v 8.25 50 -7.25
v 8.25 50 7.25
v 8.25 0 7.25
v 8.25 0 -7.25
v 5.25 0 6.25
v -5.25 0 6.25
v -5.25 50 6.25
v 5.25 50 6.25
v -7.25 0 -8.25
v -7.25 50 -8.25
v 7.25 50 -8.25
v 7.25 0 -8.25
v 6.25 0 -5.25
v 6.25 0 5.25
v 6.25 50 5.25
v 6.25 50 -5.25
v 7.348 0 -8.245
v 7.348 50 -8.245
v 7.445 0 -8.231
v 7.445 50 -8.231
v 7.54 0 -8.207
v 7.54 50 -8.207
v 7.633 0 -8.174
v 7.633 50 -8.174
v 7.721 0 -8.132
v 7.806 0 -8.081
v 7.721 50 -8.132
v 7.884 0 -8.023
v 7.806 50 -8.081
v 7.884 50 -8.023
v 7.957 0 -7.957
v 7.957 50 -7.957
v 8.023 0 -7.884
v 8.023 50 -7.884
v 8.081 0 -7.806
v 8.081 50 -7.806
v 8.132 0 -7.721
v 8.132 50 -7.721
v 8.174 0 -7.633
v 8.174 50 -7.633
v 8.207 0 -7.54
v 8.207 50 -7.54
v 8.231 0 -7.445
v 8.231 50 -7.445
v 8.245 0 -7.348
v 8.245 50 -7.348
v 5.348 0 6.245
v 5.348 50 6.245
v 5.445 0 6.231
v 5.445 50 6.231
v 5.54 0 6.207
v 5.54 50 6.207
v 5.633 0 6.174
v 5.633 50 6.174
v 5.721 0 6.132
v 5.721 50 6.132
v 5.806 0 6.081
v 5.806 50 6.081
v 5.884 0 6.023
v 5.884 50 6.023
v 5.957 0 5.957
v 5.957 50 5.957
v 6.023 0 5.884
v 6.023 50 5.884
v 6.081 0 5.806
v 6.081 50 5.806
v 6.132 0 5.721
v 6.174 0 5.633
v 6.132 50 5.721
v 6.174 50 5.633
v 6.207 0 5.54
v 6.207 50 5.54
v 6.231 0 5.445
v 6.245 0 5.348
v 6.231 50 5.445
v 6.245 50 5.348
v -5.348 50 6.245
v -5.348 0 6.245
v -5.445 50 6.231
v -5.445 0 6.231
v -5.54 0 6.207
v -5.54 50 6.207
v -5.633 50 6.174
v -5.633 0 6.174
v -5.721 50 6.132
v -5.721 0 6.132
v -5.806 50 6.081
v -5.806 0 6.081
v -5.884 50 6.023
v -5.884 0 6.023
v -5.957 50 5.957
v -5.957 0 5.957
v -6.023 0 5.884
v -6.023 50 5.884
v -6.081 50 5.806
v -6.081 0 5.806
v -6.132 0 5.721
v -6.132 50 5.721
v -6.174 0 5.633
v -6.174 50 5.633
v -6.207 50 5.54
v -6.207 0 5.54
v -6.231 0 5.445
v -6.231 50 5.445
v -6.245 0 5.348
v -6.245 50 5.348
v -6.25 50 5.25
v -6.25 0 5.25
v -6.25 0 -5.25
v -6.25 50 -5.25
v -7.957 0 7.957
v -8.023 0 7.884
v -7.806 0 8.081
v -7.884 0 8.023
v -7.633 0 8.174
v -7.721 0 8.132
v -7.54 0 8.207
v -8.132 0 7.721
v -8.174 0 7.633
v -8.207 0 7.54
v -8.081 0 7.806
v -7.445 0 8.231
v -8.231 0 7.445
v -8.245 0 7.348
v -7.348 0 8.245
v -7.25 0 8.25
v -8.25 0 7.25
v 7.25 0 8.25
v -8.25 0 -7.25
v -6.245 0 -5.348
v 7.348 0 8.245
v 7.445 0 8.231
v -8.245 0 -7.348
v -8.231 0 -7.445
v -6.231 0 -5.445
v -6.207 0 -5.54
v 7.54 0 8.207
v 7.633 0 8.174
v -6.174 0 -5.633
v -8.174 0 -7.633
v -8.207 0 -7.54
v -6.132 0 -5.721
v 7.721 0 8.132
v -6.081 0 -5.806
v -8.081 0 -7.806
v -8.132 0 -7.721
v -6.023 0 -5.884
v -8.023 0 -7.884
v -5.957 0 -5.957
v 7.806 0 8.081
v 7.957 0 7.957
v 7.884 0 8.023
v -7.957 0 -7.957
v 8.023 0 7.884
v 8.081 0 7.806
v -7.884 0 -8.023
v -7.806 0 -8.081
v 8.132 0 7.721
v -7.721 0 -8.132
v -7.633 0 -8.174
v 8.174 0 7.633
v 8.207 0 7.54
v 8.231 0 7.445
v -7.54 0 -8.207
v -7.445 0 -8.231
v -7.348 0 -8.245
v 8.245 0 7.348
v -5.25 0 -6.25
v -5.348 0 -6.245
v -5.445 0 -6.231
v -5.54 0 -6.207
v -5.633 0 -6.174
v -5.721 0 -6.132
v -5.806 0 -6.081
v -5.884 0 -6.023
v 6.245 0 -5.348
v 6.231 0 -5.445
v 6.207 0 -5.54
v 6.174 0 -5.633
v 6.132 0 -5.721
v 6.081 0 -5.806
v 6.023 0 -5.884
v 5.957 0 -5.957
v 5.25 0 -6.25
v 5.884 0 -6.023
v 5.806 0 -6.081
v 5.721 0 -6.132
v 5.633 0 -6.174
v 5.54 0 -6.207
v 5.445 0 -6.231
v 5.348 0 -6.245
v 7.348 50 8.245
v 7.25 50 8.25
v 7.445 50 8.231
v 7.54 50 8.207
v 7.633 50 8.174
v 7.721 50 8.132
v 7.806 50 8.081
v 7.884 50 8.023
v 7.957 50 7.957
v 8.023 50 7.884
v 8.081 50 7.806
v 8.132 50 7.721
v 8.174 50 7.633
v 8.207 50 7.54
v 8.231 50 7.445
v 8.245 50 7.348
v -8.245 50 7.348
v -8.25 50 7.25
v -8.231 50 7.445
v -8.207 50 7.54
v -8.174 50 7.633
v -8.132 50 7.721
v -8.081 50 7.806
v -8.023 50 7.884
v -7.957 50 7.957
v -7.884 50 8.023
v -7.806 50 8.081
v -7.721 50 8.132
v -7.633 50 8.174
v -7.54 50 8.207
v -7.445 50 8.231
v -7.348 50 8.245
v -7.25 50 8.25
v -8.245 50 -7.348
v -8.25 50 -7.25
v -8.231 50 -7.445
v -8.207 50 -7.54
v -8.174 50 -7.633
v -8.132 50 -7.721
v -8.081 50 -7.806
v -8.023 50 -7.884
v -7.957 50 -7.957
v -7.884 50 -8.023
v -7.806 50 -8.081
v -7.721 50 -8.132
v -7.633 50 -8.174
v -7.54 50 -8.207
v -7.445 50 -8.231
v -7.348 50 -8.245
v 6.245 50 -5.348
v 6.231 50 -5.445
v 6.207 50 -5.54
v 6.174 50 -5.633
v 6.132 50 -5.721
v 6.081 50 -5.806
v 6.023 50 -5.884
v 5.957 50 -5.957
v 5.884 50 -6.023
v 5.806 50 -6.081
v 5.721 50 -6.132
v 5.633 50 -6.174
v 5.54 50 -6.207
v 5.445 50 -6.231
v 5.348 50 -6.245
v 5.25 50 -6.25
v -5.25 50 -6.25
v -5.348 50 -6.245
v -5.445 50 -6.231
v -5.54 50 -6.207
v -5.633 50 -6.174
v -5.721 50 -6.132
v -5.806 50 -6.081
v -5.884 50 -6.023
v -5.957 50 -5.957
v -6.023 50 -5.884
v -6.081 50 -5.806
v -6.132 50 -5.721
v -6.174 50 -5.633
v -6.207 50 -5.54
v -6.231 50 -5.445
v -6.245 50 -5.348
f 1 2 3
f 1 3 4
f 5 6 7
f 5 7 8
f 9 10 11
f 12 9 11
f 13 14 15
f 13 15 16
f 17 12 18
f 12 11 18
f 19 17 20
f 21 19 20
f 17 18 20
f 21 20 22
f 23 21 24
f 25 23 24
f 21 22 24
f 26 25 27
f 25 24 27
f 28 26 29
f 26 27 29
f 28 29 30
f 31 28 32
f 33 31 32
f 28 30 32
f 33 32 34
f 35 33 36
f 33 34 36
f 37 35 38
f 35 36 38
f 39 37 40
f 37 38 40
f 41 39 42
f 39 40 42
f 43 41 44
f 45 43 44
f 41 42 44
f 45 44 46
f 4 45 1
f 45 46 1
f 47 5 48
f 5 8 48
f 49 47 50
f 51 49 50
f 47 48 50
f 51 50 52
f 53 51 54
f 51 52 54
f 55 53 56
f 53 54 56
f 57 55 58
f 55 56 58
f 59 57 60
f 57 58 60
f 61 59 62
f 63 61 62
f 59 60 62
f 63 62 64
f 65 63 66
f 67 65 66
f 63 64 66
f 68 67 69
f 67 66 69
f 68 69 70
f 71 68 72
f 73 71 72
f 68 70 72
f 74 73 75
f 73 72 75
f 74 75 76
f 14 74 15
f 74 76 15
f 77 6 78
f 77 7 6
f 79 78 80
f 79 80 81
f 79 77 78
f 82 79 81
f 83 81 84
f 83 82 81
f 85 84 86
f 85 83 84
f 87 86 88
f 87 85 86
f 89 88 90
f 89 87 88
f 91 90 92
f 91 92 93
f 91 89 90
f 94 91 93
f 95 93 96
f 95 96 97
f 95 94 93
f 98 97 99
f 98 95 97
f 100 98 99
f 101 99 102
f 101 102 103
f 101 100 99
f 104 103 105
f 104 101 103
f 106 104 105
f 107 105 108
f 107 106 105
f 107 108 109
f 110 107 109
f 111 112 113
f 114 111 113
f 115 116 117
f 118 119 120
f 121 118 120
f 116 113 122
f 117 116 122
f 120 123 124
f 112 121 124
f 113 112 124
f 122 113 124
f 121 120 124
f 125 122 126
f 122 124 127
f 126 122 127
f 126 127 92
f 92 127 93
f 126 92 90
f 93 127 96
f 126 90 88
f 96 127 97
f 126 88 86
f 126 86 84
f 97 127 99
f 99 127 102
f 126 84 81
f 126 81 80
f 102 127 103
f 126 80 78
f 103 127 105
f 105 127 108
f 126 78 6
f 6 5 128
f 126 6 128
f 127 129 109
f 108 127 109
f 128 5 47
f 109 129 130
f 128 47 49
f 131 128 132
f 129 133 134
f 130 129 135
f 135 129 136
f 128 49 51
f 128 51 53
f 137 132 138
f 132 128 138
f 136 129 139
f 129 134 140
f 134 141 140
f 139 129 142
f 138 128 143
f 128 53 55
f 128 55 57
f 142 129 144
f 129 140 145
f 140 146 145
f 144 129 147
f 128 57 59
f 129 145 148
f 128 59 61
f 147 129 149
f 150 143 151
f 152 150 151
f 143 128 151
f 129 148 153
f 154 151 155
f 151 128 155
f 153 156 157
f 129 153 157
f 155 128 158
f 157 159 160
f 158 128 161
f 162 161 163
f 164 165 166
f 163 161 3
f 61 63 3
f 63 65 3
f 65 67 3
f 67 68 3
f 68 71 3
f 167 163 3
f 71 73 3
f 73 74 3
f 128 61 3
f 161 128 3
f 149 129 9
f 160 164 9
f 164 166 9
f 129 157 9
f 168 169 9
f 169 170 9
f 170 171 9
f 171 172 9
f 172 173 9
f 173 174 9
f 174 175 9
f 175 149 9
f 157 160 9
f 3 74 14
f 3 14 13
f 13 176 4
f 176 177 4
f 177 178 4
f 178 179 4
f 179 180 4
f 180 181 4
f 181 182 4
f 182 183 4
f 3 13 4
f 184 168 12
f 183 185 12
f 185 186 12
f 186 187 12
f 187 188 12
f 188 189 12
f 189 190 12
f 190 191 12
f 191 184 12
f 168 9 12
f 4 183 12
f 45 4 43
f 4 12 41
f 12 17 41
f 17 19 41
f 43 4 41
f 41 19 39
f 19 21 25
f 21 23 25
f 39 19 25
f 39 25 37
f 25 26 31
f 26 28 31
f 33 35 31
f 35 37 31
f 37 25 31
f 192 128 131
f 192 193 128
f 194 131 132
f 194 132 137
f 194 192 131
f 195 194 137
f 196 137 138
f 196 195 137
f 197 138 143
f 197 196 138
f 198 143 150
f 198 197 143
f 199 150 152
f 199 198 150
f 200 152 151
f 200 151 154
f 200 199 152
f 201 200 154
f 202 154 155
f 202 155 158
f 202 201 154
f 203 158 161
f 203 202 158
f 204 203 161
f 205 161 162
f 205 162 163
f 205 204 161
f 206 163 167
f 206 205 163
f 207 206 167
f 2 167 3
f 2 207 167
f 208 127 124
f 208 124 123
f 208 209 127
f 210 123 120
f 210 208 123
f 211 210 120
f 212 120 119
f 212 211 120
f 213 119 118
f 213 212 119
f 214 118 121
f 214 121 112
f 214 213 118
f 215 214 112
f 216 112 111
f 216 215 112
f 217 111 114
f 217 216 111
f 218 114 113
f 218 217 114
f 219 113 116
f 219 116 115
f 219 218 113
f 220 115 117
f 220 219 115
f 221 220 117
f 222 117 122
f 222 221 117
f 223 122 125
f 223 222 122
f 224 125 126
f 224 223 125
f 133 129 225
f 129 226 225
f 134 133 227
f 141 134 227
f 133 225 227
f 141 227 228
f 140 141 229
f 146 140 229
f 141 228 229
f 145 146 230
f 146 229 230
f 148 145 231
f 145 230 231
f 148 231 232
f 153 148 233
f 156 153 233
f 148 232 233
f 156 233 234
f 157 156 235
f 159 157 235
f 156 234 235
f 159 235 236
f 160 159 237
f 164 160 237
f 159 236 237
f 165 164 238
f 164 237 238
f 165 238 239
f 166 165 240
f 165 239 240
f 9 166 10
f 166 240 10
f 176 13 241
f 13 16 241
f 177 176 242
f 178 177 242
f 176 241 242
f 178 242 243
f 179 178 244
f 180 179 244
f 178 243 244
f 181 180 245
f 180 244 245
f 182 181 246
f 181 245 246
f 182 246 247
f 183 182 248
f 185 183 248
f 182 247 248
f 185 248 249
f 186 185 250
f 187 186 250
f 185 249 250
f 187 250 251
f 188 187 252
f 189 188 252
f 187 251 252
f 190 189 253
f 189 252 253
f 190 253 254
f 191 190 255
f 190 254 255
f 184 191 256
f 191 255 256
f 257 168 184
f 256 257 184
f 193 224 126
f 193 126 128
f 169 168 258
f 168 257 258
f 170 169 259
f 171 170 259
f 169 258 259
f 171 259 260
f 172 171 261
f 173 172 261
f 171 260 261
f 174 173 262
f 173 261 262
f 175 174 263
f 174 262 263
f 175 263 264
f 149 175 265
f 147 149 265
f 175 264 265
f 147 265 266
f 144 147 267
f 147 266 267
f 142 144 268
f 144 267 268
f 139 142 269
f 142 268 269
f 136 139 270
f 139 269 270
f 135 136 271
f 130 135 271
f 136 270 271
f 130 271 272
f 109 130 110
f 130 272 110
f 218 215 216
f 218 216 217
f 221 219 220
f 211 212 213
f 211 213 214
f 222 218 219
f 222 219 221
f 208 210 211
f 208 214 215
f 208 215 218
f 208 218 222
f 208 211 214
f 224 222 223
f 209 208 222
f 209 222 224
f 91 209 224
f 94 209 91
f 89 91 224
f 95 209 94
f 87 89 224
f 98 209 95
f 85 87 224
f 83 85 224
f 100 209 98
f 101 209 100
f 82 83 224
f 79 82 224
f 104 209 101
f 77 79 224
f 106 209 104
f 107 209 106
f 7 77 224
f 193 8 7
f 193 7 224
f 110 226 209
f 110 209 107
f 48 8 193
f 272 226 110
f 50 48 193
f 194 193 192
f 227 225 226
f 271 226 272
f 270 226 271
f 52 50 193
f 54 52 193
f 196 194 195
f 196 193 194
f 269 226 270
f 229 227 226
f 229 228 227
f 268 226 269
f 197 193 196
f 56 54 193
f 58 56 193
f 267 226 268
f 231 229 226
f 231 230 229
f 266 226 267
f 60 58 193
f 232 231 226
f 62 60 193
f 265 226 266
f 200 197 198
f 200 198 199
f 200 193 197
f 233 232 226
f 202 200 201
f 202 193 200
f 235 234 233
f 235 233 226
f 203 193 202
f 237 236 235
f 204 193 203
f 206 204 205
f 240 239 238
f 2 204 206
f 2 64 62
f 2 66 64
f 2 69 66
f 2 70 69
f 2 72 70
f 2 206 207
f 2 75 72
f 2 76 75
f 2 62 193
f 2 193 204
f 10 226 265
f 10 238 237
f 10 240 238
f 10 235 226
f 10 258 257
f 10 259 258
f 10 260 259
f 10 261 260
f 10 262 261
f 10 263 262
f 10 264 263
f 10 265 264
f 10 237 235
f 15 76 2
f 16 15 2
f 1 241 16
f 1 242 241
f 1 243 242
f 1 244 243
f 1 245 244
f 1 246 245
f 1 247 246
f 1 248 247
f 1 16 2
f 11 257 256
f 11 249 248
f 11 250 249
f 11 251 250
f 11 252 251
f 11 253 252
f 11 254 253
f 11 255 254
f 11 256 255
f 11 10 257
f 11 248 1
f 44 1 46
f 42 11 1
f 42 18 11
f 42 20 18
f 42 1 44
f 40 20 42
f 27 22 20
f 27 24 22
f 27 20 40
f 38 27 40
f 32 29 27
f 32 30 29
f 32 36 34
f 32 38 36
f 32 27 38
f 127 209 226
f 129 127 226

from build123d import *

# Parameters (mm, degrees)
CROQUIS1_W              = 16.5
CROQUIS1_H              = 16.5
CROQUIS1_W_2            = 12.5
CROQUIS1_H_2            = 12.5
SALIENTE_EXTRUIR1_DEPTH = 50
REDONDEO1_R             = 1


with BuildPart() as part:
    # Croquis1 → Saliente-Extruir1 (new body)
    with BuildSketch(Plane(origin=(0, 0, 0), x_dir=(1, 0, 0), z_dir=(0, 1, 0))):
        Rectangle(CROQUIS1_W, CROQUIS1_H)
        Rectangle(CROQUIS1_W_2, CROQUIS1_H_2, mode=Mode.SUBTRACT)
    extrude(amount=SALIENTE_EXTRUIR1_DEPTH)

    # Redondeo1
    redondeo1_edges = [part.edges().sort_by_distance(p)[0] for p in [
        (-6.25, 25, -6.25),
        (-6.25, 25, 6.25),
        (6.25, 25, 6.25),
        (6.25, 25, -6.25),
        (-8.25, 25, -8.25),
        (8.25, 25, -8.25),
        (8.25, 25, 8.25),
        (-8.25, 25, 8.25),
    ]]
    fillet(redondeo1_edges, radius=REDONDEO1_R)


solid = part.part
